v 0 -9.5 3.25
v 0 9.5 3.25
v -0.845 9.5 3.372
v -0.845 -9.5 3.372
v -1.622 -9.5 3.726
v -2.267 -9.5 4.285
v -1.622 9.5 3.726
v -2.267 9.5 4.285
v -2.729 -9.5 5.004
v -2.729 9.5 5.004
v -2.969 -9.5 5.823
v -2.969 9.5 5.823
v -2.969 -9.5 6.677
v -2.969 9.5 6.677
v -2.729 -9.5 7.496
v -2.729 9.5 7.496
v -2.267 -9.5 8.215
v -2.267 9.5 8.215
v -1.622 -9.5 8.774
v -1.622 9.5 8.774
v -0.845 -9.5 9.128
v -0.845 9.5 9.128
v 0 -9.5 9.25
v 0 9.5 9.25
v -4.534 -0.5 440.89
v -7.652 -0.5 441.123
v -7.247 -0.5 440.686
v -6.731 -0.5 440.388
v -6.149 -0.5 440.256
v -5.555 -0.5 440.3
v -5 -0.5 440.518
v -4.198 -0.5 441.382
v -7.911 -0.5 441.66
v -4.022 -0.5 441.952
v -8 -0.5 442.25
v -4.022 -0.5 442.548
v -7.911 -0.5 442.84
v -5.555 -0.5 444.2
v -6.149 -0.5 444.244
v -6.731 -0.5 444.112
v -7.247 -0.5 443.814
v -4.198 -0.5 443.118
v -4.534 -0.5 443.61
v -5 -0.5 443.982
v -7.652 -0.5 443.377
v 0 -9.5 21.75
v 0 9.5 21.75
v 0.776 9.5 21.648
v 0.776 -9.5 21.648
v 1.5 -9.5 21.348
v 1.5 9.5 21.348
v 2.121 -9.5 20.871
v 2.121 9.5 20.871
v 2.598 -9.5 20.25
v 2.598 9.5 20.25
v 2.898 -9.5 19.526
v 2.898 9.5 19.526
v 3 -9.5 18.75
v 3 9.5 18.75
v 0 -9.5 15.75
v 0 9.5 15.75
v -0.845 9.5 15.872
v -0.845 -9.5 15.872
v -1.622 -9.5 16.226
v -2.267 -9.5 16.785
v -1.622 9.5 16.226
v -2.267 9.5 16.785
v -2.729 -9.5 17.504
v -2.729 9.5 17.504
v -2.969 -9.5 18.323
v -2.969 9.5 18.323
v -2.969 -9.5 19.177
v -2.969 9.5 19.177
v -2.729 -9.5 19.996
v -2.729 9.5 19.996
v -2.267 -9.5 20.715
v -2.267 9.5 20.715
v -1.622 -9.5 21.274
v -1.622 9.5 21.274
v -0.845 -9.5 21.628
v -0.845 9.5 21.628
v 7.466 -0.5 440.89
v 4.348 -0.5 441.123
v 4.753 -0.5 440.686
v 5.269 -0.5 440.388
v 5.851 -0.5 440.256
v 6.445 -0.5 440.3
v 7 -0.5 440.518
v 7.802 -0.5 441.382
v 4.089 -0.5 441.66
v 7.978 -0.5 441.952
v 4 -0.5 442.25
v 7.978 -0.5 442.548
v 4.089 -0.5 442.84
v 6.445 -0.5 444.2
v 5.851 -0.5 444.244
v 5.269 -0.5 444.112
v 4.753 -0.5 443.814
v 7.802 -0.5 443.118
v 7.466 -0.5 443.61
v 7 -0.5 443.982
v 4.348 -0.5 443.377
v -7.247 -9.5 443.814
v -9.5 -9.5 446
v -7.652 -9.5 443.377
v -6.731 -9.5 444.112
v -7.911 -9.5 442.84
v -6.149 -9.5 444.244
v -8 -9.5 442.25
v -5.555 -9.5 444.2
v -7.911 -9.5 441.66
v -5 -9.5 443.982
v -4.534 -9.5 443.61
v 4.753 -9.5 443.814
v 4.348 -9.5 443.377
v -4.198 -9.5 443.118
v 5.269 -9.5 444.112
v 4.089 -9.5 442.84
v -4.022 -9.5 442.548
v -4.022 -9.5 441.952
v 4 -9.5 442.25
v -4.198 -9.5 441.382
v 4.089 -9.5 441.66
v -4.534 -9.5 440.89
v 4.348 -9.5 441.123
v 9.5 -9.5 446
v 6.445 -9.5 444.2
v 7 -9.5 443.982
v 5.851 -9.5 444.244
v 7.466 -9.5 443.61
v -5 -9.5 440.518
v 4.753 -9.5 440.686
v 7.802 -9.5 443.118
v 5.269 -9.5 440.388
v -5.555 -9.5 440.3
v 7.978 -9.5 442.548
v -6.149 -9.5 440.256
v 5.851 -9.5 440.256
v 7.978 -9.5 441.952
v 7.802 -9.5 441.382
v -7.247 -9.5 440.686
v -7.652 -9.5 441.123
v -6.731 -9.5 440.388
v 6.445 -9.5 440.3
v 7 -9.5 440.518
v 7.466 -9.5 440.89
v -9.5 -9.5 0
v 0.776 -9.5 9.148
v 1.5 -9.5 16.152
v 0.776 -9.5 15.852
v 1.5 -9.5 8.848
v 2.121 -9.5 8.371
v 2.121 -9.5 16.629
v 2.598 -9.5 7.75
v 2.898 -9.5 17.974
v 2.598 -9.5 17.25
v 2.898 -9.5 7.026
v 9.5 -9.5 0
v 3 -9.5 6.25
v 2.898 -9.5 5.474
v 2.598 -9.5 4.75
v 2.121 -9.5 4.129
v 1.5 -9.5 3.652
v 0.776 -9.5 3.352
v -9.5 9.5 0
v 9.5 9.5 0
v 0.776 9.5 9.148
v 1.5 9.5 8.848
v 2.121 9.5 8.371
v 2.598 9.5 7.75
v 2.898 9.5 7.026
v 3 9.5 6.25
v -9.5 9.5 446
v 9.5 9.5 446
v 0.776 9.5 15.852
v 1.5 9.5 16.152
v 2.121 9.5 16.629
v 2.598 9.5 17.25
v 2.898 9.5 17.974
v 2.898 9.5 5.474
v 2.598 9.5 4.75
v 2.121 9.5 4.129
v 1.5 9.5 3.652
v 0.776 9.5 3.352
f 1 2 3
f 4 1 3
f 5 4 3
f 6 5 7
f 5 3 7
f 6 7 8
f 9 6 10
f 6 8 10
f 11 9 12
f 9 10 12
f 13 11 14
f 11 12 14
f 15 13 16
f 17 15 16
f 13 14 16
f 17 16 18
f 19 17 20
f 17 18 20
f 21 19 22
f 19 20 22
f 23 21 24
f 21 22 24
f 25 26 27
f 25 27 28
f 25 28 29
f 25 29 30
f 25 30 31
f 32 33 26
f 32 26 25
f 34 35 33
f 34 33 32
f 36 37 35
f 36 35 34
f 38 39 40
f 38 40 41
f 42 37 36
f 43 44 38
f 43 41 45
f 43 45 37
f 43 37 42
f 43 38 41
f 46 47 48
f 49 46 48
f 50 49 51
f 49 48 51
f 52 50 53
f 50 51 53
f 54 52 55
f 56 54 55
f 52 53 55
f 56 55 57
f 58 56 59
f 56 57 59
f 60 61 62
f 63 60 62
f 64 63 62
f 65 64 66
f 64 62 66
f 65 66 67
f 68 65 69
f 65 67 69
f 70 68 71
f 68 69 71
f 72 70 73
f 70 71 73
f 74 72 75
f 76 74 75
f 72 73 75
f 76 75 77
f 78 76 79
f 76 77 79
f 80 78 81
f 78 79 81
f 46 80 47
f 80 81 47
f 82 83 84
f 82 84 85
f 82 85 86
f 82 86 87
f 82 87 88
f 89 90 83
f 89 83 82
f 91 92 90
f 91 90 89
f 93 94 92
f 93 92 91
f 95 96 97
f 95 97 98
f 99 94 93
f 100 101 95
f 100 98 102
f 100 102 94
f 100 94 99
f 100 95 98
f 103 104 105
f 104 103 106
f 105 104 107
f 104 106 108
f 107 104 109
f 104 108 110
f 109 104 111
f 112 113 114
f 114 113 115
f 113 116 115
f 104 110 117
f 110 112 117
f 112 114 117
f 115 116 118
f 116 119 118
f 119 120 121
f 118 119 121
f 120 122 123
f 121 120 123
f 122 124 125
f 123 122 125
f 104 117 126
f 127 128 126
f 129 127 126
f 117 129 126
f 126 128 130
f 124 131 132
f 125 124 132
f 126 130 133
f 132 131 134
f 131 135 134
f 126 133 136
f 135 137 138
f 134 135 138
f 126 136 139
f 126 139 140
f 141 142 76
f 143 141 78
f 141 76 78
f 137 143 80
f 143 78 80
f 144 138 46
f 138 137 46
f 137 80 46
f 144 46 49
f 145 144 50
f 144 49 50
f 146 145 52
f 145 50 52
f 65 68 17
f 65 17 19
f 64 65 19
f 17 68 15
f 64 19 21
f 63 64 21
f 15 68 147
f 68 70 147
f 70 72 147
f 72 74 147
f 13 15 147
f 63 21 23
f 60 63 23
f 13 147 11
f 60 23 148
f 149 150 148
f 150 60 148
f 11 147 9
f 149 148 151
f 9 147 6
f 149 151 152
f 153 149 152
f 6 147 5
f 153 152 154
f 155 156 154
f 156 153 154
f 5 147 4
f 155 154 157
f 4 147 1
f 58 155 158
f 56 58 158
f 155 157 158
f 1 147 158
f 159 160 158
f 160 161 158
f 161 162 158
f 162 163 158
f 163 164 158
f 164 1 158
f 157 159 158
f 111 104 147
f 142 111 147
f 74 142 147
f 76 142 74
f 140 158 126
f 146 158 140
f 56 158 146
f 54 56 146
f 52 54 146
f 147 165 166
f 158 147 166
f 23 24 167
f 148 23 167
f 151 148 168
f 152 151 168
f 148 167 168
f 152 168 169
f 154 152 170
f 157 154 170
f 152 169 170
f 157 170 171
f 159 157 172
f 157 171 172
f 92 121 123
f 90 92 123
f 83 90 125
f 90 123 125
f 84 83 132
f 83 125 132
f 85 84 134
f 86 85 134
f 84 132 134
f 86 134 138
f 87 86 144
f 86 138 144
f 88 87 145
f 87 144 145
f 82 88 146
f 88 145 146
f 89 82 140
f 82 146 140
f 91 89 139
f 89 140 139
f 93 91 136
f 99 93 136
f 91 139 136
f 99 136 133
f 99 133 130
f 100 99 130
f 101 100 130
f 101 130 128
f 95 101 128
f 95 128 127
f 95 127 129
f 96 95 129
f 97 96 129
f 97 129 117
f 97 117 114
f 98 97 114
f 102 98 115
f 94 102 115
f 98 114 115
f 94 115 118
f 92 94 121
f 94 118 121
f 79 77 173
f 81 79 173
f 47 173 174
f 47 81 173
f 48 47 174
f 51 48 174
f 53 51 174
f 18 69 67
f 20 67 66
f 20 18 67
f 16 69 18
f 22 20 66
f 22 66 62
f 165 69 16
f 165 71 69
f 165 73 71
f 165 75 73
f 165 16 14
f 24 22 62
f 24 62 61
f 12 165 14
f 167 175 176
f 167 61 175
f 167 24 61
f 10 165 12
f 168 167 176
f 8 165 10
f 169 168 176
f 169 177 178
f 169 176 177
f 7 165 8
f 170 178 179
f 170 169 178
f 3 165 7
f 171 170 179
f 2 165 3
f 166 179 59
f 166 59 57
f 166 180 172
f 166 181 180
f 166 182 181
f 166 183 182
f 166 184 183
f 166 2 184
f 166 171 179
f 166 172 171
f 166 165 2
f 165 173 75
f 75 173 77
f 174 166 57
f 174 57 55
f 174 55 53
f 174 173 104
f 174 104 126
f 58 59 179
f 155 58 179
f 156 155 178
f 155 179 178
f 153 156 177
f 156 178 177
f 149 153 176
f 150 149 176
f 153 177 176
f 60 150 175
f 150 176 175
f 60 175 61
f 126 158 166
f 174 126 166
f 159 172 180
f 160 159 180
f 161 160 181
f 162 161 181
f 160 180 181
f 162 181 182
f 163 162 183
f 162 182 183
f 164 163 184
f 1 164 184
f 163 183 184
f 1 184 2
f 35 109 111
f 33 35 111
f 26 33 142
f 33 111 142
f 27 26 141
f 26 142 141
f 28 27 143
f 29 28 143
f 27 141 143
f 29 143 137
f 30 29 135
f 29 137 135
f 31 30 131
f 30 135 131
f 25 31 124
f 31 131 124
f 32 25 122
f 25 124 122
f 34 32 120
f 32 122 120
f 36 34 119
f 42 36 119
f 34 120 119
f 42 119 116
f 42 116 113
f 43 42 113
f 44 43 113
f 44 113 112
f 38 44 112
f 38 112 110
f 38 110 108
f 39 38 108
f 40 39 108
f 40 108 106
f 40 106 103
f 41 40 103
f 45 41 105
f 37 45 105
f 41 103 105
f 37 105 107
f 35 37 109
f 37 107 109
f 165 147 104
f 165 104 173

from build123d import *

# Parameters (mm, degrees)
SKETCH1_W               = 19
SKETCH1_H               = 19
BOSS_EXTRUDE1_DEPTH     = 446
CUT_EXTRUDE1_DEPTH      = 9
CUT_EXTRUDE2_DEPTH      = 1
CUT_EXTRUDE2_DEPTH_BACK = 20


with BuildPart() as part:
    # Sketch1 → Boss-Extrude1 (new body)
    with BuildSketch(Plane.XY):
        Rectangle(SKETCH1_W, SKETCH1_H)
    extrude(amount=BOSS_EXTRUDE1_DEPTH)

    # Sketch2 → Cut-Extrude1 (cut)
    with BuildSketch(Plane.XZ.offset(9.5)):
        with BuildLine():
            ThreePointArc((-4, 442.25), (-6, 444.25), (-8, 442.25))
            Line((-8, 442.25), (-4, 442.25))
        make_face()
        with BuildLine():
            Line((-4, 442.25), (-8, 442.25))
            ThreePointArc((-8, 442.25), (-6, 440.25), (-4, 442.25))
        make_face()
        with BuildLine():
            ThreePointArc((8, 442.25), (6, 444.25), (4, 442.25))
            Line((4, 442.25), (6, 442.25))
            Line((6, 442.25), (8, 442.25))
        make_face()
        with BuildLine():
            Line((6, 442.25), (4, 442.25))
            ThreePointArc((4, 442.25), (6, 440.25), (8, 442.25))
            Line((8, 442.25), (6, 442.25))
        make_face()
    extrude(amount=-CUT_EXTRUDE1_DEPTH, mode=Mode.SUBTRACT)

    # Sketch3 → Cut-Extrude2 (cut, two sides)
    with BuildSketch(Plane(origin=(0, 9.5, 0), x_dir=(1, 0, 0), z_dir=(0, 1, 0))) as cut_extrude2_sk:
        with BuildLine():
            ThreePointArc((3, -18.75), (2.121320344, -16.628679656), (0, -15.75))
            Line((0, -15.75), (0, -21.75))
            ThreePointArc((0, -21.75), (2.121320344, -20.871320344), (3, -18.75))
        make_face()
        with BuildLine():
            Line((0, -21.75), (0, -15.75))
            ThreePointArc((0, -15.75), (-3, -18.75), (0, -21.75))
        make_face()
        with BuildLine():
            ThreePointArc((3, -6.25), (2.121320344, -4.128679656), (0, -3.25))
            Line((0, -3.25), (0, -9.25))
            ThreePointArc((0, -9.25), (2.121320344, -8.371320344), (3, -6.25))
        make_face()
        with BuildLine():
            Line((0, -9.25), (0, -3.25))
            ThreePointArc((0, -3.25), (-3, -6.25), (0, -9.25))
        make_face()
    extrude(amount=CUT_EXTRUDE2_DEPTH, mode=Mode.SUBTRACT)
    extrude(cut_extrude2_sk.sketch, amount=-CUT_EXTRUDE2_DEPTH_BACK, mode=Mode.SUBTRACT)


solid = part.part
